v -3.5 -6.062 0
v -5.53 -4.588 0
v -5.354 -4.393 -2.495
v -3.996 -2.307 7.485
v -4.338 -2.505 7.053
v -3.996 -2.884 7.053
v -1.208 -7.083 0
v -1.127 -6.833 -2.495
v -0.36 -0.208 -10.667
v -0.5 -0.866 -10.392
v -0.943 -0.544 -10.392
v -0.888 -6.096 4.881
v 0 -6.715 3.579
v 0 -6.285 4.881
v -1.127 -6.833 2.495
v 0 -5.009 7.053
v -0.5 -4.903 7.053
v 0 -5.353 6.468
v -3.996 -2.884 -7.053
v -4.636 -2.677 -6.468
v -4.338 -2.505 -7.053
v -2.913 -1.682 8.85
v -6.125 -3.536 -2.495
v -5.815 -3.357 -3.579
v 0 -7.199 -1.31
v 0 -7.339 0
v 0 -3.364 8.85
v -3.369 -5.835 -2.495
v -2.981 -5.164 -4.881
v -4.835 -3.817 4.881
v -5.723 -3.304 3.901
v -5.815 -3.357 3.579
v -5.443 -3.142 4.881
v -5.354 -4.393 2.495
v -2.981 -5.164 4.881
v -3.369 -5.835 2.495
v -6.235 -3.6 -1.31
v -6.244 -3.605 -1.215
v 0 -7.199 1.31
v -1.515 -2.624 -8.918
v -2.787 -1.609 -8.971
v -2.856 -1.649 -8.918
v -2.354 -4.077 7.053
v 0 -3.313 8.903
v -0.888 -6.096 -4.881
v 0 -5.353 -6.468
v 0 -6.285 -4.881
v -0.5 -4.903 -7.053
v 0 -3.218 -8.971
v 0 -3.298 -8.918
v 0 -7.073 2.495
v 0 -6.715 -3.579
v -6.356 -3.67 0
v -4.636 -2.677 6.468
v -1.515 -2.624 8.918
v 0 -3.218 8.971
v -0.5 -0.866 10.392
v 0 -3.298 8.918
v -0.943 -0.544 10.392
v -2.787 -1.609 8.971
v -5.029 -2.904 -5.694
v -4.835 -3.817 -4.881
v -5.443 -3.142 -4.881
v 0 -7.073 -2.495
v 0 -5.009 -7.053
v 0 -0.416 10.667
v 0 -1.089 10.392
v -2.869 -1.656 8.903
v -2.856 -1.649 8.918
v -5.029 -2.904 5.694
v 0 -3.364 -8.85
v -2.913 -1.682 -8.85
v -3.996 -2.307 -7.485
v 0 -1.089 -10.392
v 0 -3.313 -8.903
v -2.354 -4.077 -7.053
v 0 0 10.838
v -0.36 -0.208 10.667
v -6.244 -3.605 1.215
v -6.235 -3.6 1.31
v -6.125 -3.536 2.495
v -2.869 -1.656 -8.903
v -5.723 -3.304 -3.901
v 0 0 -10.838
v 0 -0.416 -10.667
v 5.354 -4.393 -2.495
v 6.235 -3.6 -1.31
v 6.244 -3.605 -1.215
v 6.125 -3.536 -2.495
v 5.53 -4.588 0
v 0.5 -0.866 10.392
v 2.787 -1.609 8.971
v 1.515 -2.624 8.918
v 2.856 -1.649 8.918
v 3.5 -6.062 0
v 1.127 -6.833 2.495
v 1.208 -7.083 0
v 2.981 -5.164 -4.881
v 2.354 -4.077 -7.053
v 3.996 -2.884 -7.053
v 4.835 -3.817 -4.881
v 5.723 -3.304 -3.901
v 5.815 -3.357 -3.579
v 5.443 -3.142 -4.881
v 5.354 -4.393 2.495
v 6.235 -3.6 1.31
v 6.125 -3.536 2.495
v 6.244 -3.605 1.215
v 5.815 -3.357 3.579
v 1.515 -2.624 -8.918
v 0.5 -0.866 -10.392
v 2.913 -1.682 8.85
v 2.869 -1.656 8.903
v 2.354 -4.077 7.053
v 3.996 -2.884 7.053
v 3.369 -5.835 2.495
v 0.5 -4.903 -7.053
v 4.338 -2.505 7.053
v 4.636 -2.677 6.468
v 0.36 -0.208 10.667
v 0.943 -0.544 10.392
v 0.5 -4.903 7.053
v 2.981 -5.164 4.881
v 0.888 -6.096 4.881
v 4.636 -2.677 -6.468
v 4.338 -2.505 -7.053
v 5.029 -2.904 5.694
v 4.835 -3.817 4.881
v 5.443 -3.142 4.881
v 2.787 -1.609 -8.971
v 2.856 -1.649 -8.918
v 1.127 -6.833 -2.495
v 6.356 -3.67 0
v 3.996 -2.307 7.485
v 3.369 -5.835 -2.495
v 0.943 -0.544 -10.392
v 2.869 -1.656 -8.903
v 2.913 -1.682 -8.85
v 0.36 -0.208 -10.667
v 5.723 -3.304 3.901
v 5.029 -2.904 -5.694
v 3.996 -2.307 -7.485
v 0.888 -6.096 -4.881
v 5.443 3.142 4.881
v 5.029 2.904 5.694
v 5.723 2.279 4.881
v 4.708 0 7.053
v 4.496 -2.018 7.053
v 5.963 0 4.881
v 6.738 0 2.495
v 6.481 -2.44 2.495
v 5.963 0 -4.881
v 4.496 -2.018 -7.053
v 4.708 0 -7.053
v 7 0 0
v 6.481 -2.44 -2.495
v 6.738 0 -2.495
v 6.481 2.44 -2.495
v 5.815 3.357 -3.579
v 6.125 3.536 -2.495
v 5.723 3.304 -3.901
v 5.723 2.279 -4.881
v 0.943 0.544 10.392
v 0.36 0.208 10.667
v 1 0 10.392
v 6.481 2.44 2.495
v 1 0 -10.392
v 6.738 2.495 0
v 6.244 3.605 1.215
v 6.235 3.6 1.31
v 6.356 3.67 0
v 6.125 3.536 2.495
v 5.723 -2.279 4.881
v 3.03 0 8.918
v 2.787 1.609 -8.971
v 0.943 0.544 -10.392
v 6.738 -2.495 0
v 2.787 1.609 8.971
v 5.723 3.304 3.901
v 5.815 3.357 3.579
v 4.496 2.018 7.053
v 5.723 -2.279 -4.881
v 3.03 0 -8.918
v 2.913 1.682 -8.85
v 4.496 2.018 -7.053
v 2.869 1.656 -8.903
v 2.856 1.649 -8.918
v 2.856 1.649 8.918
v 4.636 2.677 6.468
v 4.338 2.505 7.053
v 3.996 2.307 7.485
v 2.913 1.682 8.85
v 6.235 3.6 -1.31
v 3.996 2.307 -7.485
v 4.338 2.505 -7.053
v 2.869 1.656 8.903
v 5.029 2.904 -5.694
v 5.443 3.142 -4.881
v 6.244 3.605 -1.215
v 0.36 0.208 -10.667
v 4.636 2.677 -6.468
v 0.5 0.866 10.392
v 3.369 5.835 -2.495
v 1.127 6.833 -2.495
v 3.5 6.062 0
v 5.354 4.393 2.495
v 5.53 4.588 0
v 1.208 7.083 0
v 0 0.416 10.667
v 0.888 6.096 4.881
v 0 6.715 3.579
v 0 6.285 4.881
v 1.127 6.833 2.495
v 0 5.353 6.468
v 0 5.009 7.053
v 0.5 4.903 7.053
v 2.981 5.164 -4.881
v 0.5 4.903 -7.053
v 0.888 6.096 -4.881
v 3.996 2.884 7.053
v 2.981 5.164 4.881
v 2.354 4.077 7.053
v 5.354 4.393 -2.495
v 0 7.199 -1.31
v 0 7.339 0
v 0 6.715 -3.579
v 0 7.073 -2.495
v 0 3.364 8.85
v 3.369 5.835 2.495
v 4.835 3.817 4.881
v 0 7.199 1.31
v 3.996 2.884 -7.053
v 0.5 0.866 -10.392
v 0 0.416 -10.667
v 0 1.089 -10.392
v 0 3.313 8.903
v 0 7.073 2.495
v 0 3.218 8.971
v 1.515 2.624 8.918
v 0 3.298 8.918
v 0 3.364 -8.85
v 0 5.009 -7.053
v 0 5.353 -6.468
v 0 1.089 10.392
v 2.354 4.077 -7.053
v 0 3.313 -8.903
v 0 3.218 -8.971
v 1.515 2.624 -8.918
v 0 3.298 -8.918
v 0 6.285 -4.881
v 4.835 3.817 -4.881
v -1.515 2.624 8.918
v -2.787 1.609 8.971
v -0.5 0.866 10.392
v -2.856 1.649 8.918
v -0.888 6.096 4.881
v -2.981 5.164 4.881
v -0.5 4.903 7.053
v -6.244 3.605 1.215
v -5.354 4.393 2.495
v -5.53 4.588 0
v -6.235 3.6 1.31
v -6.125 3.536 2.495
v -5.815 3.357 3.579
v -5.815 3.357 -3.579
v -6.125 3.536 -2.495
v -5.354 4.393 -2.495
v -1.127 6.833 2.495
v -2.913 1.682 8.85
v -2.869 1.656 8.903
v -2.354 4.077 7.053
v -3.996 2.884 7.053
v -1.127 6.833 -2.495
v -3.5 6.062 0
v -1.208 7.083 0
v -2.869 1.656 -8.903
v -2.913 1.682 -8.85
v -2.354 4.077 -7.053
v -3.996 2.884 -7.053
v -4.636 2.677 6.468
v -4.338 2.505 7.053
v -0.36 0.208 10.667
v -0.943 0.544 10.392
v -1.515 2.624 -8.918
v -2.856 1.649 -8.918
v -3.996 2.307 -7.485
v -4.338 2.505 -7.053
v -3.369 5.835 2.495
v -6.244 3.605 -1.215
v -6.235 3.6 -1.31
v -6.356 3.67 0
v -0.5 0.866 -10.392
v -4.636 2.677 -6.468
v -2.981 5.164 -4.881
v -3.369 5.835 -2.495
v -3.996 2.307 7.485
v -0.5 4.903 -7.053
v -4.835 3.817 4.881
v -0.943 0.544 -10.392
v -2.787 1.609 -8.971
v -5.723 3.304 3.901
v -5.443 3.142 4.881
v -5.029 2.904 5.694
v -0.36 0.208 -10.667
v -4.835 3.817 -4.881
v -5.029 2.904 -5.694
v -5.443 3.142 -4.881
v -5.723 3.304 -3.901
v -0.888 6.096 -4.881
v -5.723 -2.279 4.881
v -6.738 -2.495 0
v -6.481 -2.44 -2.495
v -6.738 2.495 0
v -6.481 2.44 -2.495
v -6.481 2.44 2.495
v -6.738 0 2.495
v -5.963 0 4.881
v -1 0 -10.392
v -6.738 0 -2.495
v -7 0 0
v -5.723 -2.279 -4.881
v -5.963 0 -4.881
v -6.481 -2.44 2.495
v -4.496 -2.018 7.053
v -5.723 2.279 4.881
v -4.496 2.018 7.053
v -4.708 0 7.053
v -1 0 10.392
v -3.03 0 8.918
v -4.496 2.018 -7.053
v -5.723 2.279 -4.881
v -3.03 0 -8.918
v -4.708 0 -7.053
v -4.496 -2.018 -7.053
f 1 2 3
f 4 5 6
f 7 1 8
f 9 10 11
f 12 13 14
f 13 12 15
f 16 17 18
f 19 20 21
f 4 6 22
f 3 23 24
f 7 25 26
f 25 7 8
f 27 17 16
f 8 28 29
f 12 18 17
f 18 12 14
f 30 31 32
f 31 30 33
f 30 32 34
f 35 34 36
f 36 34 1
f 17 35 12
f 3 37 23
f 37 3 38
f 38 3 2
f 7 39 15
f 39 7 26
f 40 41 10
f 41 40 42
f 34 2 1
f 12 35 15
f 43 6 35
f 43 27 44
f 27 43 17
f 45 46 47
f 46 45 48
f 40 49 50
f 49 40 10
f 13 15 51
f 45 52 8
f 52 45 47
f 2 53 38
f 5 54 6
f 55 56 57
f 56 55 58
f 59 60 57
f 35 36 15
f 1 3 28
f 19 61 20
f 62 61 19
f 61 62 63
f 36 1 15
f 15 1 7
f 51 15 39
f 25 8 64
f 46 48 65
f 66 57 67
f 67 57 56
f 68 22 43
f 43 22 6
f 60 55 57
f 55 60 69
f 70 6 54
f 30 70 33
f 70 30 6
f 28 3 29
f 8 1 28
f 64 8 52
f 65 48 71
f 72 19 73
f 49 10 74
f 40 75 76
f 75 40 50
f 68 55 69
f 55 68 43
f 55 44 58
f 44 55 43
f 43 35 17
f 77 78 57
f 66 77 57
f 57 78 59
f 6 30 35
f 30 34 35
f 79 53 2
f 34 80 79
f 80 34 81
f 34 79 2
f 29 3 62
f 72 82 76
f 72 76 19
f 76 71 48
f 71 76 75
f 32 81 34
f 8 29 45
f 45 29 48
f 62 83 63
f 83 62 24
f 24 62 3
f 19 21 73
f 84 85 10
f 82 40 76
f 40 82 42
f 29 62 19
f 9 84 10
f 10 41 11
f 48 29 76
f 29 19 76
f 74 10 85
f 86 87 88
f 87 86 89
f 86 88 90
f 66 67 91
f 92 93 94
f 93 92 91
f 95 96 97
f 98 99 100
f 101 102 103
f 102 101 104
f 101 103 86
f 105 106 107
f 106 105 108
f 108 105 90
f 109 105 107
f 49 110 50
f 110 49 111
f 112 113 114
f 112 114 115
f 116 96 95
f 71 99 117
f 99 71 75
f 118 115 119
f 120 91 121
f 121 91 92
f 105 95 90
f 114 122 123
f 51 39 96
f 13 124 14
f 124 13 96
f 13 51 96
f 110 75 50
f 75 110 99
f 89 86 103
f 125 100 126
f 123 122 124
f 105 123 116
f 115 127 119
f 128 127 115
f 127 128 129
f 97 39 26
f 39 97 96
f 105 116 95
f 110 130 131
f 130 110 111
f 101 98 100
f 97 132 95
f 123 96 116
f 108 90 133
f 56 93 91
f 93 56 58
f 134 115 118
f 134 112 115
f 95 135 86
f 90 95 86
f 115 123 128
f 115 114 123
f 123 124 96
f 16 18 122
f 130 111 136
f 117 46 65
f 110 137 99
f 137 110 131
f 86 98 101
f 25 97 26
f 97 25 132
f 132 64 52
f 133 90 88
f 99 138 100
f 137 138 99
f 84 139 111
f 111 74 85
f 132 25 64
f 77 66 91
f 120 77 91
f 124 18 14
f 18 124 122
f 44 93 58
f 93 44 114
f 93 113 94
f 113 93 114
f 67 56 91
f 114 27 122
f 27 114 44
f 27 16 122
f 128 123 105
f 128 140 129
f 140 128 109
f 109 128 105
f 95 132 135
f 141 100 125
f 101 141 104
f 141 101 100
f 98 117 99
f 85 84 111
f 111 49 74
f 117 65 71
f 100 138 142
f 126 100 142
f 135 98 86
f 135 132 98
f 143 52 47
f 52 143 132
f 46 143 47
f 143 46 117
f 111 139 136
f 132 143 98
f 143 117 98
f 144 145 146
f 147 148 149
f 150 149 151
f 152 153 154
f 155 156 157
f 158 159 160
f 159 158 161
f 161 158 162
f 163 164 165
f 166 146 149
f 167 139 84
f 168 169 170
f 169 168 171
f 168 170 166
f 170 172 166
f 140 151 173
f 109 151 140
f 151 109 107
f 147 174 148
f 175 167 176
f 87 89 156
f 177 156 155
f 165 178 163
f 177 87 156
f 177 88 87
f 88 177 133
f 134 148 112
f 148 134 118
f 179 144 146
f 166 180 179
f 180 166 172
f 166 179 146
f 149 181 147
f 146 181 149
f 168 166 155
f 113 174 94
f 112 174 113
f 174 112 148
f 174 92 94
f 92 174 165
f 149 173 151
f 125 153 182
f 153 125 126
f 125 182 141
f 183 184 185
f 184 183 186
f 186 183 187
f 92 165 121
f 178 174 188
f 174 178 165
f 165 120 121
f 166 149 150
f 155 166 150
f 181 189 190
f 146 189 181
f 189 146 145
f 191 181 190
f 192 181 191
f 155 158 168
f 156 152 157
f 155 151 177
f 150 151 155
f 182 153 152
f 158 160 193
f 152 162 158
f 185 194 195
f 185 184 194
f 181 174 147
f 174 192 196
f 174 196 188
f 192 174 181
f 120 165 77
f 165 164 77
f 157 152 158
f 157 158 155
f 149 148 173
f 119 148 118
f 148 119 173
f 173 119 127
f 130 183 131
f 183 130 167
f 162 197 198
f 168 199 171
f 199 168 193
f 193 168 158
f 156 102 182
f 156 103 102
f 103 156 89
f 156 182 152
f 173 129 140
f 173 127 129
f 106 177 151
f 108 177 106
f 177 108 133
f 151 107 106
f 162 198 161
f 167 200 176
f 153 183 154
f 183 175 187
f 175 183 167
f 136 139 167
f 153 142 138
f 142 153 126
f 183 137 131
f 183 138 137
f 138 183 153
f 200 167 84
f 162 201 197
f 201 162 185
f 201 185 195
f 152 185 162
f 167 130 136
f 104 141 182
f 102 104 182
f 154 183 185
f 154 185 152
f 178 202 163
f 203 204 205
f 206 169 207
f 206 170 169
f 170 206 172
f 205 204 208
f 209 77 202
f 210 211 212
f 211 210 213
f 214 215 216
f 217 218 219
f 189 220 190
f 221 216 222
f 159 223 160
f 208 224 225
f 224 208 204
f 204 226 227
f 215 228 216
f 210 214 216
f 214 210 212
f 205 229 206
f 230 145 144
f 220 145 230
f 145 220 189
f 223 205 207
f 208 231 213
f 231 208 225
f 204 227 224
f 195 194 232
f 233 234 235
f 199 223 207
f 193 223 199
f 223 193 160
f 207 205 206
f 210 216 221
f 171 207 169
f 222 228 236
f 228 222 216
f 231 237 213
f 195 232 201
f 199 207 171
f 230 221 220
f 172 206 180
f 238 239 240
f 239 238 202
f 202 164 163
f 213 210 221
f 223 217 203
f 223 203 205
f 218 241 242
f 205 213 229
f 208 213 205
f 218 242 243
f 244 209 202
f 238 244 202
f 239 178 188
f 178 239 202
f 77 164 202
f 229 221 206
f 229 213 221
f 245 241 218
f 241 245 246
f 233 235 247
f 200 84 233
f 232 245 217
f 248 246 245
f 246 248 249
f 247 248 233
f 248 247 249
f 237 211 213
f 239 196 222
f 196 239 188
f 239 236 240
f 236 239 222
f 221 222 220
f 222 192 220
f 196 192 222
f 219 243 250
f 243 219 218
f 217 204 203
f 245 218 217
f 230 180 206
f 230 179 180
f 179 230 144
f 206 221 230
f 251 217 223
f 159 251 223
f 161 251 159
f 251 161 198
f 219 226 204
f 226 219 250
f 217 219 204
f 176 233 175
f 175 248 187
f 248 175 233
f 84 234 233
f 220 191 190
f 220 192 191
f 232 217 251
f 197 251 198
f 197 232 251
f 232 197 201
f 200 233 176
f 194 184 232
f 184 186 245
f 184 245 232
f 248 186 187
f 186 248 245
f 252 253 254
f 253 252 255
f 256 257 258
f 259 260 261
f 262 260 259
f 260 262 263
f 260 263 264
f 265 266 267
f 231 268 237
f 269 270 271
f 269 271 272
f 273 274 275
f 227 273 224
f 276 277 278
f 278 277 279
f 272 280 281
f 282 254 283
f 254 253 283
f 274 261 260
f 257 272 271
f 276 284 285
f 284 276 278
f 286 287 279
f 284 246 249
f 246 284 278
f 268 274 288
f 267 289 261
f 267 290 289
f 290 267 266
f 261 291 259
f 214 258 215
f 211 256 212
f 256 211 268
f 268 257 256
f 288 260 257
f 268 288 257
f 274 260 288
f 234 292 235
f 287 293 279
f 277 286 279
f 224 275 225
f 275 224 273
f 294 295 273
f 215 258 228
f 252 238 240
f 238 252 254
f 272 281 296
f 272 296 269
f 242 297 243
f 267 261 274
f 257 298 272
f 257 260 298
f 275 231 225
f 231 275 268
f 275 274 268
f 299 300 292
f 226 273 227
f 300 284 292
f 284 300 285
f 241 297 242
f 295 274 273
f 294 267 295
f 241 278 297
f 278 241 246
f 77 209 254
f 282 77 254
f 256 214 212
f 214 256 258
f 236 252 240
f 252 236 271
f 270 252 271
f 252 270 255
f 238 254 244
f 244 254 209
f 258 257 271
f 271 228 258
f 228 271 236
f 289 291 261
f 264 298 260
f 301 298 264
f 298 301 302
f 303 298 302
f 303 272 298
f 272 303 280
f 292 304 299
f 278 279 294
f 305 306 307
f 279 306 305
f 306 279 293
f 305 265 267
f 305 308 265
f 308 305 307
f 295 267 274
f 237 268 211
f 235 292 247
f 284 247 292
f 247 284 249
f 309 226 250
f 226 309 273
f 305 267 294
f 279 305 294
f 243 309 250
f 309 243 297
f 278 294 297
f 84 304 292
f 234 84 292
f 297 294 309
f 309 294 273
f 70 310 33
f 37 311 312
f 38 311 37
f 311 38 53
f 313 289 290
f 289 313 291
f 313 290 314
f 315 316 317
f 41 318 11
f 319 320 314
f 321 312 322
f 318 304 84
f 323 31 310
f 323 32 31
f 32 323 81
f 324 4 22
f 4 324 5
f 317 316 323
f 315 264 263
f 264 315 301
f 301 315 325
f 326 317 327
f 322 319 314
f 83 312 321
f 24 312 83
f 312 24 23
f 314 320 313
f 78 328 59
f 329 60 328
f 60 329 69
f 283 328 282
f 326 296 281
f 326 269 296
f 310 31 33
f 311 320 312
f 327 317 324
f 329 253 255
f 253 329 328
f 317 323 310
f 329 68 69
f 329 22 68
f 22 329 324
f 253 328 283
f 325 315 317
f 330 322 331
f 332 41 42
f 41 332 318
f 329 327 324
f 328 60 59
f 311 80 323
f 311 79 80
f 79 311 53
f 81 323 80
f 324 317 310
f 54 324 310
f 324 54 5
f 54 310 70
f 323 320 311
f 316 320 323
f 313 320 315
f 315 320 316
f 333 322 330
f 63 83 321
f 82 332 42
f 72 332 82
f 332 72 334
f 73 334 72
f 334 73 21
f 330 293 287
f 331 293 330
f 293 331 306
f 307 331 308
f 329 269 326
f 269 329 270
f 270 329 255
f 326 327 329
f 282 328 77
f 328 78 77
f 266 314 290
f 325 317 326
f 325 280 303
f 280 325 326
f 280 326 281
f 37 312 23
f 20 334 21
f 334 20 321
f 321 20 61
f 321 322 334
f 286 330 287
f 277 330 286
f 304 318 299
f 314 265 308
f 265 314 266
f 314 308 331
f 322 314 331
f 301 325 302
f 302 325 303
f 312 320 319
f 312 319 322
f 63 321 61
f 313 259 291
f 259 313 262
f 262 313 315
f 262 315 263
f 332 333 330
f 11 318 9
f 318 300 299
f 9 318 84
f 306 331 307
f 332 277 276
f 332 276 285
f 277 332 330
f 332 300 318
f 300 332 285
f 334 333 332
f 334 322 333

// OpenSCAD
intersection_for(n = [1 : 6])
{
    rotate([0, 0, n * 60])
    {
        translate([5,0,0])
        sphere(r=12);
    }
}
